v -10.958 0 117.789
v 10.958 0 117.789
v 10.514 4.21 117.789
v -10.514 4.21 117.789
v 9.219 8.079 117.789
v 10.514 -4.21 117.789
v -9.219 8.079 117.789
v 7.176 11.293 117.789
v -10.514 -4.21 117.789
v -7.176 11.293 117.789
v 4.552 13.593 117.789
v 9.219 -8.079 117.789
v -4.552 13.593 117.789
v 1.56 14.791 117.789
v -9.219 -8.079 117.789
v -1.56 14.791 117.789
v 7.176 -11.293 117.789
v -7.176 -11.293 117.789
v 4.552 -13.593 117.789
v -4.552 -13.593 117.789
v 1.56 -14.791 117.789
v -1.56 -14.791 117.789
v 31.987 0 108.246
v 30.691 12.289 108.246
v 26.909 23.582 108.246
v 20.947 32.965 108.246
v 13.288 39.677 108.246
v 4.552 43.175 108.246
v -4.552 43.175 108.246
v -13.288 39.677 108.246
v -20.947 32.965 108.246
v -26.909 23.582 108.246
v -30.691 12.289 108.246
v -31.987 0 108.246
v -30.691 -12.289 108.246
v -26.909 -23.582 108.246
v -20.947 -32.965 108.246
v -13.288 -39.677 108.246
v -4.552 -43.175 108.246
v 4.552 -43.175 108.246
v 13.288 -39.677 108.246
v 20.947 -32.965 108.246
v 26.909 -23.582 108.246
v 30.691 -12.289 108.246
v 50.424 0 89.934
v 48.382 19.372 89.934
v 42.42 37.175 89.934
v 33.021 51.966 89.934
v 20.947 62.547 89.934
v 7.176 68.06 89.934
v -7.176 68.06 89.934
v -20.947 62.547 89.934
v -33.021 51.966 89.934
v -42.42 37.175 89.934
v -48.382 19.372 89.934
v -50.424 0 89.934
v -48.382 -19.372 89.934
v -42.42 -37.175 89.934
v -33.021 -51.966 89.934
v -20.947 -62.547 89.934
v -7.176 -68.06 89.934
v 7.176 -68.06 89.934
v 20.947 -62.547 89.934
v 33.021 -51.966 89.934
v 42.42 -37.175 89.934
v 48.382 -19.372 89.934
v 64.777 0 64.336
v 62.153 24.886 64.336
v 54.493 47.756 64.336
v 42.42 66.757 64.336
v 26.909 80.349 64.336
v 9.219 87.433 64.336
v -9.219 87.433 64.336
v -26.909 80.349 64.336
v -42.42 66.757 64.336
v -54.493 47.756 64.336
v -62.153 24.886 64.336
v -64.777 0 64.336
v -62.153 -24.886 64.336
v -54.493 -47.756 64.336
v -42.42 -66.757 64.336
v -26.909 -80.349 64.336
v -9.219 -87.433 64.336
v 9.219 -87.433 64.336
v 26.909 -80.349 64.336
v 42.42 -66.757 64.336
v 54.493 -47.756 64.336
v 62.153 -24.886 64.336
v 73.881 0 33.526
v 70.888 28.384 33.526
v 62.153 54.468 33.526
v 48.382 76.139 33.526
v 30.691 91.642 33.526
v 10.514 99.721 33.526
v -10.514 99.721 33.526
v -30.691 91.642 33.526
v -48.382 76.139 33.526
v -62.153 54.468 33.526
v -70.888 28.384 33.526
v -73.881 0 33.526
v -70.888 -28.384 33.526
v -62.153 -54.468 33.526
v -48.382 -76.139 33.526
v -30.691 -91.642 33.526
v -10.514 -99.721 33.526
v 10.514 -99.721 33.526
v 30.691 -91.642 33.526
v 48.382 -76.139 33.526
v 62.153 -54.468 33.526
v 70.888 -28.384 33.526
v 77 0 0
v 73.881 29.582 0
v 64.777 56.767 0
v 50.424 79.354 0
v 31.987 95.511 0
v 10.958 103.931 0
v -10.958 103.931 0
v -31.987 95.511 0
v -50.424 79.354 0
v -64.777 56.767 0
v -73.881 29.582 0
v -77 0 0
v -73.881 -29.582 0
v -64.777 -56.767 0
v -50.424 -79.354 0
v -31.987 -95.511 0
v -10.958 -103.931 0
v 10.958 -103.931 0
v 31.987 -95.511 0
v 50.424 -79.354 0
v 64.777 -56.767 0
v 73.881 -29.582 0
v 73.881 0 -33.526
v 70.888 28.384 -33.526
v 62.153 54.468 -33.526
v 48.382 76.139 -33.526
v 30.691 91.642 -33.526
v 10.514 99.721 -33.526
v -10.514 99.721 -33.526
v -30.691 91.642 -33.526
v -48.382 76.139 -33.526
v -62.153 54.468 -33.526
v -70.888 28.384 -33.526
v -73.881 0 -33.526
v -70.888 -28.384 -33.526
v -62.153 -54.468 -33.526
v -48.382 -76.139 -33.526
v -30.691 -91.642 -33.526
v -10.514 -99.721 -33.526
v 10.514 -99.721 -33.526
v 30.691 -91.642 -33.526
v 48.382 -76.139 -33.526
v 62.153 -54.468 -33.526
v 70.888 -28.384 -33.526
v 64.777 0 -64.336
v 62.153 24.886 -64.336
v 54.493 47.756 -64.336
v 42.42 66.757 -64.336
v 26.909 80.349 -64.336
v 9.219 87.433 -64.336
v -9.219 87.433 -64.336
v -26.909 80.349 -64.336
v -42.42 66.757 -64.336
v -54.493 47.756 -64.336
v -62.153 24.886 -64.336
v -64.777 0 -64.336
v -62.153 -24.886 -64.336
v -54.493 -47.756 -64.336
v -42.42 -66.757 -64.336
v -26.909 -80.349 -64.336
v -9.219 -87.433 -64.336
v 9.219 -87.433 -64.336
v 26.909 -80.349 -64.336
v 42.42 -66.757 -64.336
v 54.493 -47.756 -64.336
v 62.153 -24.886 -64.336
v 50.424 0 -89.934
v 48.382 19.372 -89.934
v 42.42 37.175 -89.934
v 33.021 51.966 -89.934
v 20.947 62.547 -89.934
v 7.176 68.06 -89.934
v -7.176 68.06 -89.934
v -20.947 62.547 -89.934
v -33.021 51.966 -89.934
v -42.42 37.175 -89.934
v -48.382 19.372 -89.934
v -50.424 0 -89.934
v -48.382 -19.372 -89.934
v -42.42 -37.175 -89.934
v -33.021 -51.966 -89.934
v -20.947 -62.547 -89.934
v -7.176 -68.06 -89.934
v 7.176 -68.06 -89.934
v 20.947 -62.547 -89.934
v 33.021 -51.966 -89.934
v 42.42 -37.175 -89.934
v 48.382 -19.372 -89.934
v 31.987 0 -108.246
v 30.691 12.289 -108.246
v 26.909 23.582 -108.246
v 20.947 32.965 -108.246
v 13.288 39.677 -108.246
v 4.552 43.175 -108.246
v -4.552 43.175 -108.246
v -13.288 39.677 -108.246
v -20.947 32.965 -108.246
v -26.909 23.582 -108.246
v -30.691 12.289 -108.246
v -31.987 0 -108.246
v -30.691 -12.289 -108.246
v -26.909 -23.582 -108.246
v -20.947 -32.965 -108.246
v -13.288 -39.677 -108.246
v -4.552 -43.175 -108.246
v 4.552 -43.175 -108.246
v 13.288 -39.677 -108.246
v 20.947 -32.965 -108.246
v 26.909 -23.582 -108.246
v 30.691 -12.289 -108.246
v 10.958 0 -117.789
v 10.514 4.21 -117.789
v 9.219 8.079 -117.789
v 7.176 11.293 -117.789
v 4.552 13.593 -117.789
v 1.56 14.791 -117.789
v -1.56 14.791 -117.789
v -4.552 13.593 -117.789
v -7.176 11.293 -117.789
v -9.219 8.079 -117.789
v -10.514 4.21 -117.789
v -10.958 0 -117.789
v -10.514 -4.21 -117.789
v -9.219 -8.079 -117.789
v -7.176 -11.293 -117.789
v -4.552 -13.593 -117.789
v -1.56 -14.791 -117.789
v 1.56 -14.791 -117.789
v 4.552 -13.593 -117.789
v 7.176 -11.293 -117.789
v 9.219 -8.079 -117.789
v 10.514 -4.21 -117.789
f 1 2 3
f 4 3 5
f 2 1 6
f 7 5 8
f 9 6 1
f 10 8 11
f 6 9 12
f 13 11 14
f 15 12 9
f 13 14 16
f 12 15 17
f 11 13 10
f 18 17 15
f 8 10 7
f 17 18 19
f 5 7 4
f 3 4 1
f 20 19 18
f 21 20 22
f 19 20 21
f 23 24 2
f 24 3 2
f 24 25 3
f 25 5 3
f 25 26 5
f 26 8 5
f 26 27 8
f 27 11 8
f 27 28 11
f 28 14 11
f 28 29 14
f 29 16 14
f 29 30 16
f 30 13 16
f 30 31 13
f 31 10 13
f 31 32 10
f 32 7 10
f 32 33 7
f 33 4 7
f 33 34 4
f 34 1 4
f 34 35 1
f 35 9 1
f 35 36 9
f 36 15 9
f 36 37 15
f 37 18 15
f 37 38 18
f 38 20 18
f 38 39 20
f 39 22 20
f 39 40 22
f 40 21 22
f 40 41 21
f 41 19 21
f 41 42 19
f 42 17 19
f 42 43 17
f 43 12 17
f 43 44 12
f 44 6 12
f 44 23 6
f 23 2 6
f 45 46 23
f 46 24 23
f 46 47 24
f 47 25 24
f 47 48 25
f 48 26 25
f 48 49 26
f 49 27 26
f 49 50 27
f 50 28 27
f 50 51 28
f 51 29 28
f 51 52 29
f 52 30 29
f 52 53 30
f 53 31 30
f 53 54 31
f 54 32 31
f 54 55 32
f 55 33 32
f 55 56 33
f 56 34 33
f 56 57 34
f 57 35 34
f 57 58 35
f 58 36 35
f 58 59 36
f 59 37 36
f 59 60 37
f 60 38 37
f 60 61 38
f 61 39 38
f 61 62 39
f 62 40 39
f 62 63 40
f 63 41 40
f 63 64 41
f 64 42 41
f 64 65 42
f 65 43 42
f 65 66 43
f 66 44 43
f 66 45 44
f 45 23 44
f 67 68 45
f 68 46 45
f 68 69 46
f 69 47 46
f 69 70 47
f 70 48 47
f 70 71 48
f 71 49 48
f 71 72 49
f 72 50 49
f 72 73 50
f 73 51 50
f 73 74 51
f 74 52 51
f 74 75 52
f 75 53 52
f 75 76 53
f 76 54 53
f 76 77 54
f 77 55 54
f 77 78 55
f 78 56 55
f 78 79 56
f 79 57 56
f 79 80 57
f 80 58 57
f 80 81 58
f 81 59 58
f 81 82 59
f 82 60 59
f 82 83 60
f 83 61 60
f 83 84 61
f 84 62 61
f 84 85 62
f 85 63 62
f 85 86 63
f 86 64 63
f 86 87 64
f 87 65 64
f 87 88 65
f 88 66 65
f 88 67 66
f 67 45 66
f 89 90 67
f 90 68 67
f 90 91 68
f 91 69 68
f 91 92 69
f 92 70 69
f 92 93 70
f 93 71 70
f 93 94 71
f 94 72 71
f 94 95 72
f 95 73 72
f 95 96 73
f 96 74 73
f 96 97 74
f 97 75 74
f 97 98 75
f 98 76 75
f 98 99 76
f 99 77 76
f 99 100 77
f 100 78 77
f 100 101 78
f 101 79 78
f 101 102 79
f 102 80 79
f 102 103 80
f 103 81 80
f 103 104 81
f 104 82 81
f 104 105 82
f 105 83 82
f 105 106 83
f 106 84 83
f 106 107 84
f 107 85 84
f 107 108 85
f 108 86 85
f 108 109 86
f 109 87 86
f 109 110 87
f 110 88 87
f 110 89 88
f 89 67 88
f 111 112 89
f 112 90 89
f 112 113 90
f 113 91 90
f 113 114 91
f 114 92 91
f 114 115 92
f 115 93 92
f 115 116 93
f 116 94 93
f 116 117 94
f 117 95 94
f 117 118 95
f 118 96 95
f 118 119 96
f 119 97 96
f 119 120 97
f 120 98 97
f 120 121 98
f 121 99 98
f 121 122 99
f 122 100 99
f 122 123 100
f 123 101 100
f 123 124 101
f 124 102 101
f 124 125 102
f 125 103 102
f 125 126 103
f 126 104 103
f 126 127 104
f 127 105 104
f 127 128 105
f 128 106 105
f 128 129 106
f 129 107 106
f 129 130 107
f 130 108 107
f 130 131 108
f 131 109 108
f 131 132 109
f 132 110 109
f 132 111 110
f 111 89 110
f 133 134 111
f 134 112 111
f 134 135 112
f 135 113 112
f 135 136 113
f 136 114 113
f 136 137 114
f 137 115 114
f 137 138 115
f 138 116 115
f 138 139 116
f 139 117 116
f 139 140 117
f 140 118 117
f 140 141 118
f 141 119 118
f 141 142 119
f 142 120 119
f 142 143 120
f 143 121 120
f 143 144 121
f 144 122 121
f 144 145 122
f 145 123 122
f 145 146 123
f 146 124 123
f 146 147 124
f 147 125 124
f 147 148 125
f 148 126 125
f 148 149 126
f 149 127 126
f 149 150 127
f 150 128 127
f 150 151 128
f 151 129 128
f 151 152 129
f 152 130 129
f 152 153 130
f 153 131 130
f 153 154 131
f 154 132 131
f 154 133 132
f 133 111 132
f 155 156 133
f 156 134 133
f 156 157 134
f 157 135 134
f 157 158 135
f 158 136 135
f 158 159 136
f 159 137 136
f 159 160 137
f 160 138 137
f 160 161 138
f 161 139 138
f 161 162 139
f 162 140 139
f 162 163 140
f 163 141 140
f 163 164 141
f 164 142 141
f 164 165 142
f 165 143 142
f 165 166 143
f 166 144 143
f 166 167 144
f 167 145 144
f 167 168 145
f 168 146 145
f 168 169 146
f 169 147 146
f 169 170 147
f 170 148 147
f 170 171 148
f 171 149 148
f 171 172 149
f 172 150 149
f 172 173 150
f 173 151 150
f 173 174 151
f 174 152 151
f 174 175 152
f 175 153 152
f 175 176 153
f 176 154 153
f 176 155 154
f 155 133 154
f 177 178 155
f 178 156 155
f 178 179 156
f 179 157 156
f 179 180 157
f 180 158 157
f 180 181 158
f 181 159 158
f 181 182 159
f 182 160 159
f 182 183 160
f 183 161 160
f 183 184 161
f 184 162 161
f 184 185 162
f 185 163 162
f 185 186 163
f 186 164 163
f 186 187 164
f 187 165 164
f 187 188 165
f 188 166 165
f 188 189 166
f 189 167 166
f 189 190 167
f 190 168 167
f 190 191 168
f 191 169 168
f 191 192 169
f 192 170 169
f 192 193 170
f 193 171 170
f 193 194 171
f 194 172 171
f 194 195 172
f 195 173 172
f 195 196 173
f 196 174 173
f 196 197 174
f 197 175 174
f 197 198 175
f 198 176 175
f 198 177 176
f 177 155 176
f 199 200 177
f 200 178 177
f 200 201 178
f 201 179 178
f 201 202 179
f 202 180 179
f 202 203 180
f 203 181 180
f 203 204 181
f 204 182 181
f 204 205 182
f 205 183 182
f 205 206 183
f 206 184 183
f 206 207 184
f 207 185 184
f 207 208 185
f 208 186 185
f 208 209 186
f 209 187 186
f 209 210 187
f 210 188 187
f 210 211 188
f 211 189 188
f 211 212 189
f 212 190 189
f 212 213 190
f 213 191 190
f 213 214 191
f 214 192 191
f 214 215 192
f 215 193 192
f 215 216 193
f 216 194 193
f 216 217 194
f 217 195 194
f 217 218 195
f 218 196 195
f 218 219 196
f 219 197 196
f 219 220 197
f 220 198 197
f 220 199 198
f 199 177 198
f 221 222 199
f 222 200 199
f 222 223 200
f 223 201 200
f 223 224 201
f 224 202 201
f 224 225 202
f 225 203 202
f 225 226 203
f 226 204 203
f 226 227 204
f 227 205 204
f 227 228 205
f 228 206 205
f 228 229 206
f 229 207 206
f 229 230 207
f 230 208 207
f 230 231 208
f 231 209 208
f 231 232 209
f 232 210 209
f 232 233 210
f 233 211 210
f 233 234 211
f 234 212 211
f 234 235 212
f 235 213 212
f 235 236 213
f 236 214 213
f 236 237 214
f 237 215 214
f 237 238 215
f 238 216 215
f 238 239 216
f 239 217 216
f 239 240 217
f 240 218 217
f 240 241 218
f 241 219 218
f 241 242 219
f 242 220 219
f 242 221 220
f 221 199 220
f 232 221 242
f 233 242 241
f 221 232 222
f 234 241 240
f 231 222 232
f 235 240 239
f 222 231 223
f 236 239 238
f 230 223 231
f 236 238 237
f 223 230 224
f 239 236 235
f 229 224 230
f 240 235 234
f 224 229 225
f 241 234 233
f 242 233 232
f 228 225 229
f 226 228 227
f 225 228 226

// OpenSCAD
// Generated by SolidPython 1.0.1 on 2020-07-29 00:46:50


scale(v = [11, 15, 17]) {
	sphere(r = 7);
}
/***********************************************
*********      SolidPython code:      **********
************************************************
 
# import packages: SolidPython
from solid import *
from solid.utils import *
from itertools import chain, combinations, permutations


class Resize:

    def __init__(self, scad_file):
        self.scad_file = scad_file
        #self.scad_file = import_scad(scad_file)
        # cone/cylinder param:
        self.r1 = 0
        self.r2 = 0
        self.h = 0
        # rectangular prism param:
        self.w = 0
        self.l = 0
        # ellipse param:
        self.r = 0

    # import OpenScad code (file name corresponds to shape)


    # classify shape + parameters
    def assign(self, param1, param2, param3):
        if self.scad_file == 'cone.scad':
            self.r1 = param1
            self.r2 = param2
            self.h = param3
        elif self.scad_file == 'cylinder.scad':
            self.r1 = param1
            self.r2 = param2
            self.h = param3
        elif self.scad_file == 'rectangularPrism.scad':
            self.h = param1
            self.l = param2
            self.w = param3
        else:
            self.r = param1
            self.h = param2

    # resize parameters
    def iterate(self):
        x = range(3, 20, 2)
        i = 1
        if self.scad_file == 'cone.scad':
            tempList = list(permutations(x, 2))
            for temp in tempList:
                param1 = temp[0]
                param2 = temp[1]
                filepath = 'produced_scad_files/' + 'cone' + str(param1) + '_' + str(param2) + '_' + '.scad'
                scad_render_to_file(cylinder(h=param1, r1=param2, r2=0), filepath)

        elif self.scad_file == 'cylinder.scad':
            tempList = list(permutations(x, 3))
            for temp in tempList:
                param1 = temp[0]
                param2 = temp[1]
                filepath = 'produced_scad_files/' + 'cylinder' + str(param1) + '_' + str(param2) + '_' + '.scad'
                scad_render_to_file(cylinder(h=param1, r1=param2, r2=param2), filepath)

        elif self.scad_file == 'rectangularPrism.scad':
            tempList = list(permutations(x, 3))
            for temp in tempList:
                param1 = temp[0]
                param2 = temp[1]
                param3 = temp[2]
                filepath = 'produced_scad_files/' + 'rectangularPrism' + str(param1) + '_' + str(param2) + '_' + str(
                    param3) + '.scad'
                scad_render_to_file(cube(size=(param1, param2, param3)), filepath)

        elif self.scad_file == 'ellipse.scad':
            tempList = list(permutations(x, 4))
            for temp in tempList:
                param1 = temp[0]
                param2 = temp[1]
                param3 = temp[2]
                param4 = temp[3]
                filepath = 'produced_scad_files/' + 'ellipse' + str(param1) + '_' + str(param2) + '_' + str(param3) + '_' + str(param4) + '.scad'
                scad_render_to_file(scale([param1, param2, param3])(sphere(r=param4)), filepath)

    def render_to_scadfile(self):
        scad_render_to_file(scad, 'example.scad') 
 
************************************************/
